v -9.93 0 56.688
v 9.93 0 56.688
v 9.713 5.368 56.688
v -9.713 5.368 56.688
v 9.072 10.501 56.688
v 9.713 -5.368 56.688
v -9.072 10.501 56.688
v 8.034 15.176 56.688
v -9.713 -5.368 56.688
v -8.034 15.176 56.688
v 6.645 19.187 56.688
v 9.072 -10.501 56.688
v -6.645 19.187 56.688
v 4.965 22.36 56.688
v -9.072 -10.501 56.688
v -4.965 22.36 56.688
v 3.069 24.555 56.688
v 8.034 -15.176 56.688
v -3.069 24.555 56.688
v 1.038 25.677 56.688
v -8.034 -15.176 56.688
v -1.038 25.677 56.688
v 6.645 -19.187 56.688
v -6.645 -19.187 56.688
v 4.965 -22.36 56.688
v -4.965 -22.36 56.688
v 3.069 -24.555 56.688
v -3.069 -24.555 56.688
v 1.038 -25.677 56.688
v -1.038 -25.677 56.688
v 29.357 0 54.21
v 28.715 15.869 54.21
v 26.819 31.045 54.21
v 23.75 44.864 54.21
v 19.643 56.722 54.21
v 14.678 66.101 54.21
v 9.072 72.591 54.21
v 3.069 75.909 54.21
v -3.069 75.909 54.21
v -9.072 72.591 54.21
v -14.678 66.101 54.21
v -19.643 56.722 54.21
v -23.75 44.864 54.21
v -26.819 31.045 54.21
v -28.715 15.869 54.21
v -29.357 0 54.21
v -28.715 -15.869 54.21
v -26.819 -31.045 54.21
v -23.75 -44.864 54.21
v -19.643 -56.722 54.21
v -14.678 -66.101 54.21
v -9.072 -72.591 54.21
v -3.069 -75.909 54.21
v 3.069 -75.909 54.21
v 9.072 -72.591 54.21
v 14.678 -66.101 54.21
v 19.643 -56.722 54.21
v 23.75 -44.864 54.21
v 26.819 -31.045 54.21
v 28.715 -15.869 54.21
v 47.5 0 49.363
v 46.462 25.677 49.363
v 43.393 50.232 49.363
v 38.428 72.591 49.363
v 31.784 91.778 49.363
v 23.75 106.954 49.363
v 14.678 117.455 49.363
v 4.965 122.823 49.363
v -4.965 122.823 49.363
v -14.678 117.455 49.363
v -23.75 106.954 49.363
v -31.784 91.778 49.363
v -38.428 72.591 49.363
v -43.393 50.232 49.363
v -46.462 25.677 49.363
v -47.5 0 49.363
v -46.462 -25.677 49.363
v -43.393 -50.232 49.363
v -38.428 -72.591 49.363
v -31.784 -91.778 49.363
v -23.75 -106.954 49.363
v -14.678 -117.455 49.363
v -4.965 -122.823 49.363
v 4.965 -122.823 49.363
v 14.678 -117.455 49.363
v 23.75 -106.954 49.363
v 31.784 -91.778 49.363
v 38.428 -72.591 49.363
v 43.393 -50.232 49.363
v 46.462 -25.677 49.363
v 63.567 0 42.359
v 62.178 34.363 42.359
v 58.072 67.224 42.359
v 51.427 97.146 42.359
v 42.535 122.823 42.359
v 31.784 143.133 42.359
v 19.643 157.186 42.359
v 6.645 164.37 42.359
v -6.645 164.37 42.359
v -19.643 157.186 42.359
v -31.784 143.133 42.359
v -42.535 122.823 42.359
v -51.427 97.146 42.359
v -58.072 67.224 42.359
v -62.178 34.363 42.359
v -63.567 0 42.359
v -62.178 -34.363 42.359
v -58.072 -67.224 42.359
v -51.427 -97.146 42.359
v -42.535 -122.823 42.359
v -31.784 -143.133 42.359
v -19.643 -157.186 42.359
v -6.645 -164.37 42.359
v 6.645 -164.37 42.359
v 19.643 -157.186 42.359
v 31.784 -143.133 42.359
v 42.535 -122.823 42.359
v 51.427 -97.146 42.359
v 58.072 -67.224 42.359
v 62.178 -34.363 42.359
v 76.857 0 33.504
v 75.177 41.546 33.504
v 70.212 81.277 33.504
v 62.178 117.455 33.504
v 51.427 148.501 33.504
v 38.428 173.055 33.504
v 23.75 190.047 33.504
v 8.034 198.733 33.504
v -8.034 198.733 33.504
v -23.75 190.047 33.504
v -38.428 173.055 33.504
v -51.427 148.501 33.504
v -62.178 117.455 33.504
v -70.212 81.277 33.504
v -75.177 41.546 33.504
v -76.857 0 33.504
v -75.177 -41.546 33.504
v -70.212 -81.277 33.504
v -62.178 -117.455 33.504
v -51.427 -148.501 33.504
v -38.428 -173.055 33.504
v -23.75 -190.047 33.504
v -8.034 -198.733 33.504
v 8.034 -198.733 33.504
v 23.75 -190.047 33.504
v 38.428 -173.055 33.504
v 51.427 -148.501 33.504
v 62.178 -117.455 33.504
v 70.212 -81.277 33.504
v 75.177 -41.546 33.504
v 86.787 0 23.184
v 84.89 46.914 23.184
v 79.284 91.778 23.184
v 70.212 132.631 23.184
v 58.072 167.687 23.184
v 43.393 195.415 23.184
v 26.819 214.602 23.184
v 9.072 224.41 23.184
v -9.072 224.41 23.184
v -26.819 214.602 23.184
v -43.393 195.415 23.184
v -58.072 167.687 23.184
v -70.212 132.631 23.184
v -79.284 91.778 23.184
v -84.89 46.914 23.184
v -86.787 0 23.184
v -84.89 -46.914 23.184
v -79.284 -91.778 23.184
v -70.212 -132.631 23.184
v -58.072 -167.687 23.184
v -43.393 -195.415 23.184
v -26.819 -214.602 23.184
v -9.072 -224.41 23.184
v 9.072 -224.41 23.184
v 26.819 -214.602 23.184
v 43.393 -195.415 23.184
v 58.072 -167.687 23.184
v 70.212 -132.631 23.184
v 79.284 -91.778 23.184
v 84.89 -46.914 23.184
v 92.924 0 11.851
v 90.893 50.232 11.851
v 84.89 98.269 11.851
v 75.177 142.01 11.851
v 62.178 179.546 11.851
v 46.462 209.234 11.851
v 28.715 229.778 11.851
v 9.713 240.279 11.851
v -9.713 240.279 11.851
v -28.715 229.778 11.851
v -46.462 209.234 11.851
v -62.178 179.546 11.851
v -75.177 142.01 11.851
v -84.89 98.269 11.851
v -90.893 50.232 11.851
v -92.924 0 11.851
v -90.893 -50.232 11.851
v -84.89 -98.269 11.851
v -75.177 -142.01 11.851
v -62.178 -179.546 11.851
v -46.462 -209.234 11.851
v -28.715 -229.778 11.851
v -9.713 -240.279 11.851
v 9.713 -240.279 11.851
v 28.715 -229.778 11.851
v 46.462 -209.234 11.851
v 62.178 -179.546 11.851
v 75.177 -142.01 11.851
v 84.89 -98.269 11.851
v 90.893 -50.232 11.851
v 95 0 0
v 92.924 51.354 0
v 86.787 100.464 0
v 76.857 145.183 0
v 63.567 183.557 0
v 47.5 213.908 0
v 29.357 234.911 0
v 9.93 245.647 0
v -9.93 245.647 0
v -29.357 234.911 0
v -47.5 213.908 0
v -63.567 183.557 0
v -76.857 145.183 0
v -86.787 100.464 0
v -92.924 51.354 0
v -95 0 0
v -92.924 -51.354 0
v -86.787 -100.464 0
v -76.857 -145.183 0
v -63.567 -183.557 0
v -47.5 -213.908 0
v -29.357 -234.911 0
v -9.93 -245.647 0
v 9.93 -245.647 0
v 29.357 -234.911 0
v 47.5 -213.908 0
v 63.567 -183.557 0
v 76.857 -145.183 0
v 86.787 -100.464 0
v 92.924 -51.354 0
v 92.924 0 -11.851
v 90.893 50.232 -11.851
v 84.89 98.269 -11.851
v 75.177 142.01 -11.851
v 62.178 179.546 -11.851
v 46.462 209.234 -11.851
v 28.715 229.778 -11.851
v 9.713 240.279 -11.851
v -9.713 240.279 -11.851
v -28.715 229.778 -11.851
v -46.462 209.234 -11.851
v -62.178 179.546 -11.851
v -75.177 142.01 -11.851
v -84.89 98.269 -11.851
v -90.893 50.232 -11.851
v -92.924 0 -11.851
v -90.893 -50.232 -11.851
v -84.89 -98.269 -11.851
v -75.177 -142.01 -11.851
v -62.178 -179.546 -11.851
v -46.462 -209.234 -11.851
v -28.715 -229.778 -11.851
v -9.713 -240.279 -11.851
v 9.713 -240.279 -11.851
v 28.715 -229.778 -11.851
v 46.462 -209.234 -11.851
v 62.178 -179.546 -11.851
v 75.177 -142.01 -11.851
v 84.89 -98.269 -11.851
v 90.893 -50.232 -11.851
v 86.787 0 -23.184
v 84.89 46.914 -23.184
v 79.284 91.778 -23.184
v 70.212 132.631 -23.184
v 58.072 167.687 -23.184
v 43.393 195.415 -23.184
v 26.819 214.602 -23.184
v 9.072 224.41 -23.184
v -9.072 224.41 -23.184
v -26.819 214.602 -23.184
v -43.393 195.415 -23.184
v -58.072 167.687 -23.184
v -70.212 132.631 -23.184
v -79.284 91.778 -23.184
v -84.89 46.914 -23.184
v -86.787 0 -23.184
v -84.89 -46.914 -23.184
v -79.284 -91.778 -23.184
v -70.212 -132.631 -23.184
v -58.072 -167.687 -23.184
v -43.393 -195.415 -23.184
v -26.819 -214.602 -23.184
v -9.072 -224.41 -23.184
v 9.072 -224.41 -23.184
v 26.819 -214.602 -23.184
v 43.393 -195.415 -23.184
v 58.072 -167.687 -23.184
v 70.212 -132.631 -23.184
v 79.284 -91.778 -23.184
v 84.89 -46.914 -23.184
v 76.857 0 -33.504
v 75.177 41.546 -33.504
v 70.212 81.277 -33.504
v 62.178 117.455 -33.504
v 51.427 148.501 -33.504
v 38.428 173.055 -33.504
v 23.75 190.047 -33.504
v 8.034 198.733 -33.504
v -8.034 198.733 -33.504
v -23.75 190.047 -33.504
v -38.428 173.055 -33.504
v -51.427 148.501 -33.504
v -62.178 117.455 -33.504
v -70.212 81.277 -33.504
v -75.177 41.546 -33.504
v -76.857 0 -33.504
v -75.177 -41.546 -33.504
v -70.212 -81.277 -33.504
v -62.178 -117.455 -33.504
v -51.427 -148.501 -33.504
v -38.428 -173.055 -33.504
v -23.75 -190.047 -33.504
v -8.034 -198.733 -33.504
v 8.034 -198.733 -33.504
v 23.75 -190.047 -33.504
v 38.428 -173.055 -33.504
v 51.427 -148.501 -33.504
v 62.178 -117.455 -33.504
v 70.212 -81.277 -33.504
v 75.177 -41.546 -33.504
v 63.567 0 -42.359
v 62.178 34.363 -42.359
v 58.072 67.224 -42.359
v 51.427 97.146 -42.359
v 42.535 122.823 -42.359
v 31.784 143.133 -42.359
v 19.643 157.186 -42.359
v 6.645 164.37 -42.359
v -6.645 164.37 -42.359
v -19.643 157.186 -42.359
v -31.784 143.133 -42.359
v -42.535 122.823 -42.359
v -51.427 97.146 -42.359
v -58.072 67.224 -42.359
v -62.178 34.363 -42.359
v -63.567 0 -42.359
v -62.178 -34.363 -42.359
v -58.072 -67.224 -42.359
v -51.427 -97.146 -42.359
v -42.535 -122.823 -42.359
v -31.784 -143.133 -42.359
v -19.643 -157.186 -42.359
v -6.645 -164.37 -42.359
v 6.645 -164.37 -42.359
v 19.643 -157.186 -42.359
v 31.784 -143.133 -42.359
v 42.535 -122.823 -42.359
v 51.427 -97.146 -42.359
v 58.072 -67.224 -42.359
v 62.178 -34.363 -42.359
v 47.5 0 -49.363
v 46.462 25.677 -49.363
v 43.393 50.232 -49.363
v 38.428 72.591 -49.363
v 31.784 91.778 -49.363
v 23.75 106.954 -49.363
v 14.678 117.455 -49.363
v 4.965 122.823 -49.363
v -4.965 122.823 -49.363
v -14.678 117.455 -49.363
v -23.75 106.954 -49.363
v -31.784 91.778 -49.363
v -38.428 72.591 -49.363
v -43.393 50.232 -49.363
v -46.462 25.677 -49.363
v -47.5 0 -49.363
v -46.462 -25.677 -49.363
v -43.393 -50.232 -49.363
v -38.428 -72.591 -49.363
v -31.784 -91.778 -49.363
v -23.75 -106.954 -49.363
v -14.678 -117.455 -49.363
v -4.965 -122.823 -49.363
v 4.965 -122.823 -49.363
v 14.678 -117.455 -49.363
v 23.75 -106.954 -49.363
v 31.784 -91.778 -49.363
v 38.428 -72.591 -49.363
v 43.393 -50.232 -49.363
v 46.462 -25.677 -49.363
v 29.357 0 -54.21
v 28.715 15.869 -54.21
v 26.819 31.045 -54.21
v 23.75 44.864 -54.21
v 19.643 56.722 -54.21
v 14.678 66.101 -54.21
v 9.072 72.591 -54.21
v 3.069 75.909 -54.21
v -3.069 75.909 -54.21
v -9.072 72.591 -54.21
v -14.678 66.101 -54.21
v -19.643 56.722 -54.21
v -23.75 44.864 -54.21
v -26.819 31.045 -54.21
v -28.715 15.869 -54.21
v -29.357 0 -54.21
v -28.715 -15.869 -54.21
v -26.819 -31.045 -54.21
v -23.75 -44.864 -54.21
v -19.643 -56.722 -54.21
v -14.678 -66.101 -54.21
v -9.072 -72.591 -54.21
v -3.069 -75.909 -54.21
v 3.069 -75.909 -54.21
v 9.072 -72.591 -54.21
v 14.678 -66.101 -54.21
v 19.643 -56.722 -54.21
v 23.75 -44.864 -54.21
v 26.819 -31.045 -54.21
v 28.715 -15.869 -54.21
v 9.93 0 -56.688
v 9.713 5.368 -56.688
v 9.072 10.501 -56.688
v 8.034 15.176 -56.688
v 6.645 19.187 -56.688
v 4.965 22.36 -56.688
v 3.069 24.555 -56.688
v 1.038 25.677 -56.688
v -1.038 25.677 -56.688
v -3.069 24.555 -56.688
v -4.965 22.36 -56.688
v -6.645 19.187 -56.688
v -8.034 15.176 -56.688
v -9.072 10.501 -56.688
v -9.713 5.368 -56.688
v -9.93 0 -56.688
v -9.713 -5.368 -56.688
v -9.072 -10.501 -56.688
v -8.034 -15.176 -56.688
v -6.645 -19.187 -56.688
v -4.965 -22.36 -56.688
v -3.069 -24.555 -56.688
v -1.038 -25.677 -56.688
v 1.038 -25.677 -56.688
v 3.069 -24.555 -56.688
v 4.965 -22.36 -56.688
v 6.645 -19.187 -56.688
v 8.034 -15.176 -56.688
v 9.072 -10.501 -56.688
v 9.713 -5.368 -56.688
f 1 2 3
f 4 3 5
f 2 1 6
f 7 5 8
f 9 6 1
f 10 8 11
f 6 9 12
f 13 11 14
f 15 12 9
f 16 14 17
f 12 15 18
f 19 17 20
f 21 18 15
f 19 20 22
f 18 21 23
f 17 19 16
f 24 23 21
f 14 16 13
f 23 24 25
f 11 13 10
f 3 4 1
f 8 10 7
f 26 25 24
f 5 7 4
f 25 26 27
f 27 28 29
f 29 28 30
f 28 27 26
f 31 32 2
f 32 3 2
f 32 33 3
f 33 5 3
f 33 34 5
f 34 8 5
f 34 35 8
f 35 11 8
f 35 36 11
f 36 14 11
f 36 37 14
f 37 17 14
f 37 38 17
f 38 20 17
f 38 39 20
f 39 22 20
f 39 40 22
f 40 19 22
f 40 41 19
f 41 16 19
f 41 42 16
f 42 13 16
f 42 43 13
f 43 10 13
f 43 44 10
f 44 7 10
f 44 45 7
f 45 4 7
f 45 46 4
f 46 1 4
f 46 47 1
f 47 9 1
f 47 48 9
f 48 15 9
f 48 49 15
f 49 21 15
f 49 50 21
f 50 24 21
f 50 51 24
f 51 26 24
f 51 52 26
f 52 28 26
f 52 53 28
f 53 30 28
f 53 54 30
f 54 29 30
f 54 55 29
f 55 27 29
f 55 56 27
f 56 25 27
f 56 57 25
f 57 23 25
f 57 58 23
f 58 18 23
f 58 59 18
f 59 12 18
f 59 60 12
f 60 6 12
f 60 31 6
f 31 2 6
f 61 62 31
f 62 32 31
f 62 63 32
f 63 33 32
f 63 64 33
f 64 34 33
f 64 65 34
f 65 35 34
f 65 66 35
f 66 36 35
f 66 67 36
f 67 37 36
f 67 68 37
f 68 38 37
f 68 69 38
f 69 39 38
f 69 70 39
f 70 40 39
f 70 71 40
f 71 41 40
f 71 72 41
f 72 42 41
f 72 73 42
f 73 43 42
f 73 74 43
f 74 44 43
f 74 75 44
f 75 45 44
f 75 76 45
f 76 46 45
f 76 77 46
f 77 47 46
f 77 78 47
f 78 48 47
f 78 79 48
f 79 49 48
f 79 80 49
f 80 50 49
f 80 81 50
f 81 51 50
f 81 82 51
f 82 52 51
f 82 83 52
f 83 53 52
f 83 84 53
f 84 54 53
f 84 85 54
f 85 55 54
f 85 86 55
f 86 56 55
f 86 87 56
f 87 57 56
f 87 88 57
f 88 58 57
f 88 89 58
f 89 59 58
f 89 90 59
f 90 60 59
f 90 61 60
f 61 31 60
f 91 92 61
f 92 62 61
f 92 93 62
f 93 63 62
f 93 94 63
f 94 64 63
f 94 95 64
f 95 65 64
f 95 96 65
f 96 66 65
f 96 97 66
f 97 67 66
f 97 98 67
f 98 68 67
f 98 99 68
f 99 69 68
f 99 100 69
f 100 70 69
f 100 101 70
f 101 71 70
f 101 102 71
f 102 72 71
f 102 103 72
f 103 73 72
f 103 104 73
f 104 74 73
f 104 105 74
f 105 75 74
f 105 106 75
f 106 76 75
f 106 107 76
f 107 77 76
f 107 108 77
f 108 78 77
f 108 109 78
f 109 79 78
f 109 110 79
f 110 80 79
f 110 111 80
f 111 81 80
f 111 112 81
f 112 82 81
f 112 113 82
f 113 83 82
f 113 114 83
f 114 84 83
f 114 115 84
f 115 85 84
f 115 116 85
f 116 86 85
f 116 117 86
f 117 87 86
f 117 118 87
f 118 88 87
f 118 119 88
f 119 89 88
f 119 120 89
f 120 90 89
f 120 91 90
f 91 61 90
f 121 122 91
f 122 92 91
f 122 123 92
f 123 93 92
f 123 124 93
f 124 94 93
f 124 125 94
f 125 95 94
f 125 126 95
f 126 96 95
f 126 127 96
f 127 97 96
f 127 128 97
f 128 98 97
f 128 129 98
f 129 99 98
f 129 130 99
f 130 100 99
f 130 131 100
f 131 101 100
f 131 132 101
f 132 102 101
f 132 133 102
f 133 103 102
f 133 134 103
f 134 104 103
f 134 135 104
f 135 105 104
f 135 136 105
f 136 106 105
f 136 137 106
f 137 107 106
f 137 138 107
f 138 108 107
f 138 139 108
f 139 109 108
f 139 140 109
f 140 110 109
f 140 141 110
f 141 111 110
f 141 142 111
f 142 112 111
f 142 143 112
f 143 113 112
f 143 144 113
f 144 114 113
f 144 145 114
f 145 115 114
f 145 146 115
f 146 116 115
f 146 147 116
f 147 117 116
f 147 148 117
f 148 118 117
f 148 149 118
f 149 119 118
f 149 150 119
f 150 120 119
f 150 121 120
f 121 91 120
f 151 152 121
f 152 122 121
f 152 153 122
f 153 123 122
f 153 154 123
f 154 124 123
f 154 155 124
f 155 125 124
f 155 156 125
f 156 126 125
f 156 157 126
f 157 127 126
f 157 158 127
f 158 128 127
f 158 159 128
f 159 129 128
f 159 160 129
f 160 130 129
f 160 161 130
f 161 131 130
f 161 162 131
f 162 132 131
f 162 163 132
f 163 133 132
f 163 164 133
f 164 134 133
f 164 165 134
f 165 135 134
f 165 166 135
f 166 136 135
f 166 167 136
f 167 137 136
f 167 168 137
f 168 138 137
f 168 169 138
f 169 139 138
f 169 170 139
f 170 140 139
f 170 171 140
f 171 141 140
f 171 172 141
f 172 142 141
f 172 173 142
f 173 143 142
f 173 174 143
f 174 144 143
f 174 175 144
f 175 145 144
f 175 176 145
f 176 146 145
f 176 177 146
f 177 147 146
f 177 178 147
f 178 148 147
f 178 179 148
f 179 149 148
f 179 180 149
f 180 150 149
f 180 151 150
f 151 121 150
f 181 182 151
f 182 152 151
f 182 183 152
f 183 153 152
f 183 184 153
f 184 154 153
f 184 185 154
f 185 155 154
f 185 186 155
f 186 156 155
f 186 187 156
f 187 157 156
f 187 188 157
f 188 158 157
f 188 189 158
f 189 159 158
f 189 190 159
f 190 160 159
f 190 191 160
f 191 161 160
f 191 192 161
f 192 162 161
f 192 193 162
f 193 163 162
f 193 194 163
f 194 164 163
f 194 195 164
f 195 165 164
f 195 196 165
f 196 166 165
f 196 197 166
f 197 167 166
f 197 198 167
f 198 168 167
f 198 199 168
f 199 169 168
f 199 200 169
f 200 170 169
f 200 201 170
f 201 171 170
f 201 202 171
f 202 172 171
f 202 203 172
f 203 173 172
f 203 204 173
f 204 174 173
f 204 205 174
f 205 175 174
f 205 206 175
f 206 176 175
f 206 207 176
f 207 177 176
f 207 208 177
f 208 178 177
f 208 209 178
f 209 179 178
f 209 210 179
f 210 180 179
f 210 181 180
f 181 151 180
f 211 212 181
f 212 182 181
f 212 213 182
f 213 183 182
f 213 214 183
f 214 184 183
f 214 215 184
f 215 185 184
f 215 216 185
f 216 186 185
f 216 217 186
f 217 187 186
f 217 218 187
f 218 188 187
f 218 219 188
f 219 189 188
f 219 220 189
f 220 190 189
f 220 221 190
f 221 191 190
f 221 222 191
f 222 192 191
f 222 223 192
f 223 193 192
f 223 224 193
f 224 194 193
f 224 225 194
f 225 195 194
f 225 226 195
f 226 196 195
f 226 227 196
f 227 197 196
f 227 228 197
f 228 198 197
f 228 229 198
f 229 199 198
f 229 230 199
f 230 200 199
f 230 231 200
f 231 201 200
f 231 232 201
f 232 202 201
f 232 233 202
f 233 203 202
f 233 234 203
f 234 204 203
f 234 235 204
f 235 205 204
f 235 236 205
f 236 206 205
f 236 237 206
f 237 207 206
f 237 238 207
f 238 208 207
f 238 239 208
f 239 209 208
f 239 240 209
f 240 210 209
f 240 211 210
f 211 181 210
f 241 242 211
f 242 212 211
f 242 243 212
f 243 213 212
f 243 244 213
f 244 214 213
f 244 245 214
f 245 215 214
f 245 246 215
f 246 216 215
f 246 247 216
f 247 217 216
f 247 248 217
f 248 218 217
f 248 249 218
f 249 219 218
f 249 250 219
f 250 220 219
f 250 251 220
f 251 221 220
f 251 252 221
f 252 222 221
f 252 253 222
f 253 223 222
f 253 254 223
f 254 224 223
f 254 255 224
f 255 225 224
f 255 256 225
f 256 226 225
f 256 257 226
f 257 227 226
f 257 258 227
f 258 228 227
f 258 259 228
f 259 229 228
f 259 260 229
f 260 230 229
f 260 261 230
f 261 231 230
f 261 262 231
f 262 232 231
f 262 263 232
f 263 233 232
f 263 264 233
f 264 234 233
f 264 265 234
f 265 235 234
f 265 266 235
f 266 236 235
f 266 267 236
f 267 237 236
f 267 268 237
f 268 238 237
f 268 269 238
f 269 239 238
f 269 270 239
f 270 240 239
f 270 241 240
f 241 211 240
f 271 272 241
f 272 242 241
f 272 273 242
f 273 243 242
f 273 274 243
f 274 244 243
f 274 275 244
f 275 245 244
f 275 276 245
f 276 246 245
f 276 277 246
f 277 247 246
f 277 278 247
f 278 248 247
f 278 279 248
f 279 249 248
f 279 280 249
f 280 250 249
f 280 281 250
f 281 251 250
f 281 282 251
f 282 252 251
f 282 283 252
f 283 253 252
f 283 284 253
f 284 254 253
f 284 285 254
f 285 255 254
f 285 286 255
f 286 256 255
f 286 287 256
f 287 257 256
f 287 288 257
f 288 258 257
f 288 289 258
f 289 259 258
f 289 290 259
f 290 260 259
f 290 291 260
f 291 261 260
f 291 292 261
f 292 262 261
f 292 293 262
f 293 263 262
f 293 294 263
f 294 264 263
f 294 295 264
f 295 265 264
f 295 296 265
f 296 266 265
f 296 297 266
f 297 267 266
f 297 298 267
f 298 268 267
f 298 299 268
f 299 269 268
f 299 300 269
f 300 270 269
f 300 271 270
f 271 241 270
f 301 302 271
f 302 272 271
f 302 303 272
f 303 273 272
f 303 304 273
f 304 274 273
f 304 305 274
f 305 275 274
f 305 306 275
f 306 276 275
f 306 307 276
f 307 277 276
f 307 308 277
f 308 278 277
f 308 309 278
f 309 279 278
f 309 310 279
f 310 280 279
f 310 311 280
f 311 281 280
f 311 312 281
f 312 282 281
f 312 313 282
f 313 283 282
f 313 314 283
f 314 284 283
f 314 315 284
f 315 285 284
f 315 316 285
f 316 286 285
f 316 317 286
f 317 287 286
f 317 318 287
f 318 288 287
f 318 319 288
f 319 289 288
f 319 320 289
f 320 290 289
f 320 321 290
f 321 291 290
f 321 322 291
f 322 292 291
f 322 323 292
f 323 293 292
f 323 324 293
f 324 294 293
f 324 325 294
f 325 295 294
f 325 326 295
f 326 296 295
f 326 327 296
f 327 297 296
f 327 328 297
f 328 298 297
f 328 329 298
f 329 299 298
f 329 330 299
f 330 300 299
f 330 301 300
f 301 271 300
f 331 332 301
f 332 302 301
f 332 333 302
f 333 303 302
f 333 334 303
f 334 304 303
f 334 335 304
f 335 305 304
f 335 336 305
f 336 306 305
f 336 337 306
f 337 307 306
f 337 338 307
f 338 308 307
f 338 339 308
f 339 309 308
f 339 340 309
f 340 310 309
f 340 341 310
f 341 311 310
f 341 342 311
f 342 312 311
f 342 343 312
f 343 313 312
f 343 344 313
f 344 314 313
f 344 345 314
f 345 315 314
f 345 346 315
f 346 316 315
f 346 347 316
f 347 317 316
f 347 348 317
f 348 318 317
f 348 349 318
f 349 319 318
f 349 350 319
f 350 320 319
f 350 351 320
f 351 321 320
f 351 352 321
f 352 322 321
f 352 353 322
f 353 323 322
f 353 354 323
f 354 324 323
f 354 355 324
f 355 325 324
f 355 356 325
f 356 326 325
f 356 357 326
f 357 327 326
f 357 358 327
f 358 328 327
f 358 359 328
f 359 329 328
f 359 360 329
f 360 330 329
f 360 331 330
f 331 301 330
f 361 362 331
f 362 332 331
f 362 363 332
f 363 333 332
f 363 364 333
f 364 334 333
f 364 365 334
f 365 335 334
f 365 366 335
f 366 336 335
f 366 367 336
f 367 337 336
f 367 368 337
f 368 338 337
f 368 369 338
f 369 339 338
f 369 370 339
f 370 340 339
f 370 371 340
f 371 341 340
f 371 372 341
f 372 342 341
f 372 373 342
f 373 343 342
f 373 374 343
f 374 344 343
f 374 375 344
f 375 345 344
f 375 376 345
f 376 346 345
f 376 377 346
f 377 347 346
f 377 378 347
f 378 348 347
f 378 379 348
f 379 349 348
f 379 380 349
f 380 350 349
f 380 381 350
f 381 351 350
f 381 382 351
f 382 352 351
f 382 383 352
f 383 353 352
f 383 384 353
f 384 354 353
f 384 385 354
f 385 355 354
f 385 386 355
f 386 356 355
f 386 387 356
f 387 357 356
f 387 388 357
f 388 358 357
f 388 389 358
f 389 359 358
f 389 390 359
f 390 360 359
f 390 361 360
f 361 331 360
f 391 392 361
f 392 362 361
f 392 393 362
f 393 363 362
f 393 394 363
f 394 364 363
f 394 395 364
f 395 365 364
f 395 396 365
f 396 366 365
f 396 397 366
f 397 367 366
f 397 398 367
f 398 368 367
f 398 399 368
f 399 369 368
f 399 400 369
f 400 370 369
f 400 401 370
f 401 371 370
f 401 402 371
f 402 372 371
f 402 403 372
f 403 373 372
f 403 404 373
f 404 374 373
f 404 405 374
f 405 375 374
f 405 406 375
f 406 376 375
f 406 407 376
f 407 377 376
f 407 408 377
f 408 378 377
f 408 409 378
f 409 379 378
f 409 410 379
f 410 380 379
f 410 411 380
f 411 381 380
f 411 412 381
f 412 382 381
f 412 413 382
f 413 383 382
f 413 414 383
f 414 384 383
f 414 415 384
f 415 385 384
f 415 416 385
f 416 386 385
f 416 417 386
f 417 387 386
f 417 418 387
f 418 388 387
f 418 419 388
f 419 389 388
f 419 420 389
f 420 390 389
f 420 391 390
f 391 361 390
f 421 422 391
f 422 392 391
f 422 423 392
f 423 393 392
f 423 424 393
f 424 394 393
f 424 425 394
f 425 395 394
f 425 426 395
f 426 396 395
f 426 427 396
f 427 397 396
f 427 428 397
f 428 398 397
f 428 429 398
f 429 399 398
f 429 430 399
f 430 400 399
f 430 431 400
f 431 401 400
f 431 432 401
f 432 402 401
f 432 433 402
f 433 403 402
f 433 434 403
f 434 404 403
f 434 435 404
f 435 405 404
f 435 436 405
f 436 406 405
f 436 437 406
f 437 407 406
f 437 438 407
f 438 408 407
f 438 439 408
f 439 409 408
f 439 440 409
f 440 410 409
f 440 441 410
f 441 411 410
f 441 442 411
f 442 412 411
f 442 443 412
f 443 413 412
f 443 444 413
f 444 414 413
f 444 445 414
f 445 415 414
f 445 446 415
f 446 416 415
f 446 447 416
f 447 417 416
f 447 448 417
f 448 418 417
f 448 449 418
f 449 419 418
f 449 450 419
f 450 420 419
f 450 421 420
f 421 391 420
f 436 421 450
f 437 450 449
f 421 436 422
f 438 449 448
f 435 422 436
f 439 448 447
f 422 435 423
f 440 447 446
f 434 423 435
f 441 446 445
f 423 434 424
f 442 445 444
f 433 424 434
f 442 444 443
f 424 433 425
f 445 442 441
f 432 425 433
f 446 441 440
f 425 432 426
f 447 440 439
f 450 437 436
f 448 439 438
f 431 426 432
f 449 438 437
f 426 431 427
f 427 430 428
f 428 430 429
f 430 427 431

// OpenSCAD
// Generated by SolidPython 1.0.1 on 2020-07-29 00:46:46


scale(v = [5, 13, 3]) {
	sphere(r = 19);
}
/***********************************************
*********      SolidPython code:      **********
************************************************
 
# import packages: SolidPython
from solid import *
from solid.utils import *
from itertools import chain, combinations, permutations


class Resize:

    def __init__(self, scad_file):
        self.scad_file = scad_file
        #self.scad_file = import_scad(scad_file)
        # cone/cylinder param:
        self.r1 = 0
        self.r2 = 0
        self.h = 0
        # rectangular prism param:
        self.w = 0
        self.l = 0
        # ellipse param:
        self.r = 0

    # import OpenScad code (file name corresponds to shape)


    # classify shape + parameters
    def assign(self, param1, param2, param3):
        if self.scad_file == 'cone.scad':
            self.r1 = param1
            self.r2 = param2
            self.h = param3
        elif self.scad_file == 'cylinder.scad':
            self.r1 = param1
            self.r2 = param2
            self.h = param3
        elif self.scad_file == 'rectangularPrism.scad':
            self.h = param1
            self.l = param2
            self.w = param3
        else:
            self.r = param1
            self.h = param2

    # resize parameters
    def iterate(self):
        x = range(3, 20, 2)
        i = 1
        if self.scad_file == 'cone.scad':
            tempList = list(permutations(x, 2))
            for temp in tempList:
                param1 = temp[0]
                param2 = temp[1]
                filepath = 'produced_scad_files/' + 'cone' + str(param1) + '_' + str(param2) + '_' + '.scad'
                scad_render_to_file(cylinder(h=param1, r1=param2, r2=0), filepath)

        elif self.scad_file == 'cylinder.scad':
            tempList = list(permutations(x, 3))
            for temp in tempList:
                param1 = temp[0]
                param2 = temp[1]
                filepath = 'produced_scad_files/' + 'cylinder' + str(param1) + '_' + str(param2) + '_' + '.scad'
                scad_render_to_file(cylinder(h=param1, r1=param2, r2=param2), filepath)

        elif self.scad_file == 'rectangularPrism.scad':
            tempList = list(permutations(x, 3))
            for temp in tempList:
                param1 = temp[0]
                param2 = temp[1]
                param3 = temp[2]
                filepath = 'produced_scad_files/' + 'rectangularPrism' + str(param1) + '_' + str(param2) + '_' + str(
                    param3) + '.scad'
                scad_render_to_file(cube(size=(param1, param2, param3)), filepath)

        elif self.scad_file == 'ellipse.scad':
            tempList = list(permutations(x, 4))
            for temp in tempList:
                param1 = temp[0]
                param2 = temp[1]
                param3 = temp[2]
                param4 = temp[3]
                filepath = 'produced_scad_files/' + 'ellipse' + str(param1) + '_' + str(param2) + '_' + str(param3) + '_' + str(param4) + '.scad'
                scad_render_to_file(scale([param1, param2, param3])(sphere(r=param4)), filepath)

    def render_to_scadfile(self):
        scad_render_to_file(scad, 'example.scad') 
 
************************************************/
